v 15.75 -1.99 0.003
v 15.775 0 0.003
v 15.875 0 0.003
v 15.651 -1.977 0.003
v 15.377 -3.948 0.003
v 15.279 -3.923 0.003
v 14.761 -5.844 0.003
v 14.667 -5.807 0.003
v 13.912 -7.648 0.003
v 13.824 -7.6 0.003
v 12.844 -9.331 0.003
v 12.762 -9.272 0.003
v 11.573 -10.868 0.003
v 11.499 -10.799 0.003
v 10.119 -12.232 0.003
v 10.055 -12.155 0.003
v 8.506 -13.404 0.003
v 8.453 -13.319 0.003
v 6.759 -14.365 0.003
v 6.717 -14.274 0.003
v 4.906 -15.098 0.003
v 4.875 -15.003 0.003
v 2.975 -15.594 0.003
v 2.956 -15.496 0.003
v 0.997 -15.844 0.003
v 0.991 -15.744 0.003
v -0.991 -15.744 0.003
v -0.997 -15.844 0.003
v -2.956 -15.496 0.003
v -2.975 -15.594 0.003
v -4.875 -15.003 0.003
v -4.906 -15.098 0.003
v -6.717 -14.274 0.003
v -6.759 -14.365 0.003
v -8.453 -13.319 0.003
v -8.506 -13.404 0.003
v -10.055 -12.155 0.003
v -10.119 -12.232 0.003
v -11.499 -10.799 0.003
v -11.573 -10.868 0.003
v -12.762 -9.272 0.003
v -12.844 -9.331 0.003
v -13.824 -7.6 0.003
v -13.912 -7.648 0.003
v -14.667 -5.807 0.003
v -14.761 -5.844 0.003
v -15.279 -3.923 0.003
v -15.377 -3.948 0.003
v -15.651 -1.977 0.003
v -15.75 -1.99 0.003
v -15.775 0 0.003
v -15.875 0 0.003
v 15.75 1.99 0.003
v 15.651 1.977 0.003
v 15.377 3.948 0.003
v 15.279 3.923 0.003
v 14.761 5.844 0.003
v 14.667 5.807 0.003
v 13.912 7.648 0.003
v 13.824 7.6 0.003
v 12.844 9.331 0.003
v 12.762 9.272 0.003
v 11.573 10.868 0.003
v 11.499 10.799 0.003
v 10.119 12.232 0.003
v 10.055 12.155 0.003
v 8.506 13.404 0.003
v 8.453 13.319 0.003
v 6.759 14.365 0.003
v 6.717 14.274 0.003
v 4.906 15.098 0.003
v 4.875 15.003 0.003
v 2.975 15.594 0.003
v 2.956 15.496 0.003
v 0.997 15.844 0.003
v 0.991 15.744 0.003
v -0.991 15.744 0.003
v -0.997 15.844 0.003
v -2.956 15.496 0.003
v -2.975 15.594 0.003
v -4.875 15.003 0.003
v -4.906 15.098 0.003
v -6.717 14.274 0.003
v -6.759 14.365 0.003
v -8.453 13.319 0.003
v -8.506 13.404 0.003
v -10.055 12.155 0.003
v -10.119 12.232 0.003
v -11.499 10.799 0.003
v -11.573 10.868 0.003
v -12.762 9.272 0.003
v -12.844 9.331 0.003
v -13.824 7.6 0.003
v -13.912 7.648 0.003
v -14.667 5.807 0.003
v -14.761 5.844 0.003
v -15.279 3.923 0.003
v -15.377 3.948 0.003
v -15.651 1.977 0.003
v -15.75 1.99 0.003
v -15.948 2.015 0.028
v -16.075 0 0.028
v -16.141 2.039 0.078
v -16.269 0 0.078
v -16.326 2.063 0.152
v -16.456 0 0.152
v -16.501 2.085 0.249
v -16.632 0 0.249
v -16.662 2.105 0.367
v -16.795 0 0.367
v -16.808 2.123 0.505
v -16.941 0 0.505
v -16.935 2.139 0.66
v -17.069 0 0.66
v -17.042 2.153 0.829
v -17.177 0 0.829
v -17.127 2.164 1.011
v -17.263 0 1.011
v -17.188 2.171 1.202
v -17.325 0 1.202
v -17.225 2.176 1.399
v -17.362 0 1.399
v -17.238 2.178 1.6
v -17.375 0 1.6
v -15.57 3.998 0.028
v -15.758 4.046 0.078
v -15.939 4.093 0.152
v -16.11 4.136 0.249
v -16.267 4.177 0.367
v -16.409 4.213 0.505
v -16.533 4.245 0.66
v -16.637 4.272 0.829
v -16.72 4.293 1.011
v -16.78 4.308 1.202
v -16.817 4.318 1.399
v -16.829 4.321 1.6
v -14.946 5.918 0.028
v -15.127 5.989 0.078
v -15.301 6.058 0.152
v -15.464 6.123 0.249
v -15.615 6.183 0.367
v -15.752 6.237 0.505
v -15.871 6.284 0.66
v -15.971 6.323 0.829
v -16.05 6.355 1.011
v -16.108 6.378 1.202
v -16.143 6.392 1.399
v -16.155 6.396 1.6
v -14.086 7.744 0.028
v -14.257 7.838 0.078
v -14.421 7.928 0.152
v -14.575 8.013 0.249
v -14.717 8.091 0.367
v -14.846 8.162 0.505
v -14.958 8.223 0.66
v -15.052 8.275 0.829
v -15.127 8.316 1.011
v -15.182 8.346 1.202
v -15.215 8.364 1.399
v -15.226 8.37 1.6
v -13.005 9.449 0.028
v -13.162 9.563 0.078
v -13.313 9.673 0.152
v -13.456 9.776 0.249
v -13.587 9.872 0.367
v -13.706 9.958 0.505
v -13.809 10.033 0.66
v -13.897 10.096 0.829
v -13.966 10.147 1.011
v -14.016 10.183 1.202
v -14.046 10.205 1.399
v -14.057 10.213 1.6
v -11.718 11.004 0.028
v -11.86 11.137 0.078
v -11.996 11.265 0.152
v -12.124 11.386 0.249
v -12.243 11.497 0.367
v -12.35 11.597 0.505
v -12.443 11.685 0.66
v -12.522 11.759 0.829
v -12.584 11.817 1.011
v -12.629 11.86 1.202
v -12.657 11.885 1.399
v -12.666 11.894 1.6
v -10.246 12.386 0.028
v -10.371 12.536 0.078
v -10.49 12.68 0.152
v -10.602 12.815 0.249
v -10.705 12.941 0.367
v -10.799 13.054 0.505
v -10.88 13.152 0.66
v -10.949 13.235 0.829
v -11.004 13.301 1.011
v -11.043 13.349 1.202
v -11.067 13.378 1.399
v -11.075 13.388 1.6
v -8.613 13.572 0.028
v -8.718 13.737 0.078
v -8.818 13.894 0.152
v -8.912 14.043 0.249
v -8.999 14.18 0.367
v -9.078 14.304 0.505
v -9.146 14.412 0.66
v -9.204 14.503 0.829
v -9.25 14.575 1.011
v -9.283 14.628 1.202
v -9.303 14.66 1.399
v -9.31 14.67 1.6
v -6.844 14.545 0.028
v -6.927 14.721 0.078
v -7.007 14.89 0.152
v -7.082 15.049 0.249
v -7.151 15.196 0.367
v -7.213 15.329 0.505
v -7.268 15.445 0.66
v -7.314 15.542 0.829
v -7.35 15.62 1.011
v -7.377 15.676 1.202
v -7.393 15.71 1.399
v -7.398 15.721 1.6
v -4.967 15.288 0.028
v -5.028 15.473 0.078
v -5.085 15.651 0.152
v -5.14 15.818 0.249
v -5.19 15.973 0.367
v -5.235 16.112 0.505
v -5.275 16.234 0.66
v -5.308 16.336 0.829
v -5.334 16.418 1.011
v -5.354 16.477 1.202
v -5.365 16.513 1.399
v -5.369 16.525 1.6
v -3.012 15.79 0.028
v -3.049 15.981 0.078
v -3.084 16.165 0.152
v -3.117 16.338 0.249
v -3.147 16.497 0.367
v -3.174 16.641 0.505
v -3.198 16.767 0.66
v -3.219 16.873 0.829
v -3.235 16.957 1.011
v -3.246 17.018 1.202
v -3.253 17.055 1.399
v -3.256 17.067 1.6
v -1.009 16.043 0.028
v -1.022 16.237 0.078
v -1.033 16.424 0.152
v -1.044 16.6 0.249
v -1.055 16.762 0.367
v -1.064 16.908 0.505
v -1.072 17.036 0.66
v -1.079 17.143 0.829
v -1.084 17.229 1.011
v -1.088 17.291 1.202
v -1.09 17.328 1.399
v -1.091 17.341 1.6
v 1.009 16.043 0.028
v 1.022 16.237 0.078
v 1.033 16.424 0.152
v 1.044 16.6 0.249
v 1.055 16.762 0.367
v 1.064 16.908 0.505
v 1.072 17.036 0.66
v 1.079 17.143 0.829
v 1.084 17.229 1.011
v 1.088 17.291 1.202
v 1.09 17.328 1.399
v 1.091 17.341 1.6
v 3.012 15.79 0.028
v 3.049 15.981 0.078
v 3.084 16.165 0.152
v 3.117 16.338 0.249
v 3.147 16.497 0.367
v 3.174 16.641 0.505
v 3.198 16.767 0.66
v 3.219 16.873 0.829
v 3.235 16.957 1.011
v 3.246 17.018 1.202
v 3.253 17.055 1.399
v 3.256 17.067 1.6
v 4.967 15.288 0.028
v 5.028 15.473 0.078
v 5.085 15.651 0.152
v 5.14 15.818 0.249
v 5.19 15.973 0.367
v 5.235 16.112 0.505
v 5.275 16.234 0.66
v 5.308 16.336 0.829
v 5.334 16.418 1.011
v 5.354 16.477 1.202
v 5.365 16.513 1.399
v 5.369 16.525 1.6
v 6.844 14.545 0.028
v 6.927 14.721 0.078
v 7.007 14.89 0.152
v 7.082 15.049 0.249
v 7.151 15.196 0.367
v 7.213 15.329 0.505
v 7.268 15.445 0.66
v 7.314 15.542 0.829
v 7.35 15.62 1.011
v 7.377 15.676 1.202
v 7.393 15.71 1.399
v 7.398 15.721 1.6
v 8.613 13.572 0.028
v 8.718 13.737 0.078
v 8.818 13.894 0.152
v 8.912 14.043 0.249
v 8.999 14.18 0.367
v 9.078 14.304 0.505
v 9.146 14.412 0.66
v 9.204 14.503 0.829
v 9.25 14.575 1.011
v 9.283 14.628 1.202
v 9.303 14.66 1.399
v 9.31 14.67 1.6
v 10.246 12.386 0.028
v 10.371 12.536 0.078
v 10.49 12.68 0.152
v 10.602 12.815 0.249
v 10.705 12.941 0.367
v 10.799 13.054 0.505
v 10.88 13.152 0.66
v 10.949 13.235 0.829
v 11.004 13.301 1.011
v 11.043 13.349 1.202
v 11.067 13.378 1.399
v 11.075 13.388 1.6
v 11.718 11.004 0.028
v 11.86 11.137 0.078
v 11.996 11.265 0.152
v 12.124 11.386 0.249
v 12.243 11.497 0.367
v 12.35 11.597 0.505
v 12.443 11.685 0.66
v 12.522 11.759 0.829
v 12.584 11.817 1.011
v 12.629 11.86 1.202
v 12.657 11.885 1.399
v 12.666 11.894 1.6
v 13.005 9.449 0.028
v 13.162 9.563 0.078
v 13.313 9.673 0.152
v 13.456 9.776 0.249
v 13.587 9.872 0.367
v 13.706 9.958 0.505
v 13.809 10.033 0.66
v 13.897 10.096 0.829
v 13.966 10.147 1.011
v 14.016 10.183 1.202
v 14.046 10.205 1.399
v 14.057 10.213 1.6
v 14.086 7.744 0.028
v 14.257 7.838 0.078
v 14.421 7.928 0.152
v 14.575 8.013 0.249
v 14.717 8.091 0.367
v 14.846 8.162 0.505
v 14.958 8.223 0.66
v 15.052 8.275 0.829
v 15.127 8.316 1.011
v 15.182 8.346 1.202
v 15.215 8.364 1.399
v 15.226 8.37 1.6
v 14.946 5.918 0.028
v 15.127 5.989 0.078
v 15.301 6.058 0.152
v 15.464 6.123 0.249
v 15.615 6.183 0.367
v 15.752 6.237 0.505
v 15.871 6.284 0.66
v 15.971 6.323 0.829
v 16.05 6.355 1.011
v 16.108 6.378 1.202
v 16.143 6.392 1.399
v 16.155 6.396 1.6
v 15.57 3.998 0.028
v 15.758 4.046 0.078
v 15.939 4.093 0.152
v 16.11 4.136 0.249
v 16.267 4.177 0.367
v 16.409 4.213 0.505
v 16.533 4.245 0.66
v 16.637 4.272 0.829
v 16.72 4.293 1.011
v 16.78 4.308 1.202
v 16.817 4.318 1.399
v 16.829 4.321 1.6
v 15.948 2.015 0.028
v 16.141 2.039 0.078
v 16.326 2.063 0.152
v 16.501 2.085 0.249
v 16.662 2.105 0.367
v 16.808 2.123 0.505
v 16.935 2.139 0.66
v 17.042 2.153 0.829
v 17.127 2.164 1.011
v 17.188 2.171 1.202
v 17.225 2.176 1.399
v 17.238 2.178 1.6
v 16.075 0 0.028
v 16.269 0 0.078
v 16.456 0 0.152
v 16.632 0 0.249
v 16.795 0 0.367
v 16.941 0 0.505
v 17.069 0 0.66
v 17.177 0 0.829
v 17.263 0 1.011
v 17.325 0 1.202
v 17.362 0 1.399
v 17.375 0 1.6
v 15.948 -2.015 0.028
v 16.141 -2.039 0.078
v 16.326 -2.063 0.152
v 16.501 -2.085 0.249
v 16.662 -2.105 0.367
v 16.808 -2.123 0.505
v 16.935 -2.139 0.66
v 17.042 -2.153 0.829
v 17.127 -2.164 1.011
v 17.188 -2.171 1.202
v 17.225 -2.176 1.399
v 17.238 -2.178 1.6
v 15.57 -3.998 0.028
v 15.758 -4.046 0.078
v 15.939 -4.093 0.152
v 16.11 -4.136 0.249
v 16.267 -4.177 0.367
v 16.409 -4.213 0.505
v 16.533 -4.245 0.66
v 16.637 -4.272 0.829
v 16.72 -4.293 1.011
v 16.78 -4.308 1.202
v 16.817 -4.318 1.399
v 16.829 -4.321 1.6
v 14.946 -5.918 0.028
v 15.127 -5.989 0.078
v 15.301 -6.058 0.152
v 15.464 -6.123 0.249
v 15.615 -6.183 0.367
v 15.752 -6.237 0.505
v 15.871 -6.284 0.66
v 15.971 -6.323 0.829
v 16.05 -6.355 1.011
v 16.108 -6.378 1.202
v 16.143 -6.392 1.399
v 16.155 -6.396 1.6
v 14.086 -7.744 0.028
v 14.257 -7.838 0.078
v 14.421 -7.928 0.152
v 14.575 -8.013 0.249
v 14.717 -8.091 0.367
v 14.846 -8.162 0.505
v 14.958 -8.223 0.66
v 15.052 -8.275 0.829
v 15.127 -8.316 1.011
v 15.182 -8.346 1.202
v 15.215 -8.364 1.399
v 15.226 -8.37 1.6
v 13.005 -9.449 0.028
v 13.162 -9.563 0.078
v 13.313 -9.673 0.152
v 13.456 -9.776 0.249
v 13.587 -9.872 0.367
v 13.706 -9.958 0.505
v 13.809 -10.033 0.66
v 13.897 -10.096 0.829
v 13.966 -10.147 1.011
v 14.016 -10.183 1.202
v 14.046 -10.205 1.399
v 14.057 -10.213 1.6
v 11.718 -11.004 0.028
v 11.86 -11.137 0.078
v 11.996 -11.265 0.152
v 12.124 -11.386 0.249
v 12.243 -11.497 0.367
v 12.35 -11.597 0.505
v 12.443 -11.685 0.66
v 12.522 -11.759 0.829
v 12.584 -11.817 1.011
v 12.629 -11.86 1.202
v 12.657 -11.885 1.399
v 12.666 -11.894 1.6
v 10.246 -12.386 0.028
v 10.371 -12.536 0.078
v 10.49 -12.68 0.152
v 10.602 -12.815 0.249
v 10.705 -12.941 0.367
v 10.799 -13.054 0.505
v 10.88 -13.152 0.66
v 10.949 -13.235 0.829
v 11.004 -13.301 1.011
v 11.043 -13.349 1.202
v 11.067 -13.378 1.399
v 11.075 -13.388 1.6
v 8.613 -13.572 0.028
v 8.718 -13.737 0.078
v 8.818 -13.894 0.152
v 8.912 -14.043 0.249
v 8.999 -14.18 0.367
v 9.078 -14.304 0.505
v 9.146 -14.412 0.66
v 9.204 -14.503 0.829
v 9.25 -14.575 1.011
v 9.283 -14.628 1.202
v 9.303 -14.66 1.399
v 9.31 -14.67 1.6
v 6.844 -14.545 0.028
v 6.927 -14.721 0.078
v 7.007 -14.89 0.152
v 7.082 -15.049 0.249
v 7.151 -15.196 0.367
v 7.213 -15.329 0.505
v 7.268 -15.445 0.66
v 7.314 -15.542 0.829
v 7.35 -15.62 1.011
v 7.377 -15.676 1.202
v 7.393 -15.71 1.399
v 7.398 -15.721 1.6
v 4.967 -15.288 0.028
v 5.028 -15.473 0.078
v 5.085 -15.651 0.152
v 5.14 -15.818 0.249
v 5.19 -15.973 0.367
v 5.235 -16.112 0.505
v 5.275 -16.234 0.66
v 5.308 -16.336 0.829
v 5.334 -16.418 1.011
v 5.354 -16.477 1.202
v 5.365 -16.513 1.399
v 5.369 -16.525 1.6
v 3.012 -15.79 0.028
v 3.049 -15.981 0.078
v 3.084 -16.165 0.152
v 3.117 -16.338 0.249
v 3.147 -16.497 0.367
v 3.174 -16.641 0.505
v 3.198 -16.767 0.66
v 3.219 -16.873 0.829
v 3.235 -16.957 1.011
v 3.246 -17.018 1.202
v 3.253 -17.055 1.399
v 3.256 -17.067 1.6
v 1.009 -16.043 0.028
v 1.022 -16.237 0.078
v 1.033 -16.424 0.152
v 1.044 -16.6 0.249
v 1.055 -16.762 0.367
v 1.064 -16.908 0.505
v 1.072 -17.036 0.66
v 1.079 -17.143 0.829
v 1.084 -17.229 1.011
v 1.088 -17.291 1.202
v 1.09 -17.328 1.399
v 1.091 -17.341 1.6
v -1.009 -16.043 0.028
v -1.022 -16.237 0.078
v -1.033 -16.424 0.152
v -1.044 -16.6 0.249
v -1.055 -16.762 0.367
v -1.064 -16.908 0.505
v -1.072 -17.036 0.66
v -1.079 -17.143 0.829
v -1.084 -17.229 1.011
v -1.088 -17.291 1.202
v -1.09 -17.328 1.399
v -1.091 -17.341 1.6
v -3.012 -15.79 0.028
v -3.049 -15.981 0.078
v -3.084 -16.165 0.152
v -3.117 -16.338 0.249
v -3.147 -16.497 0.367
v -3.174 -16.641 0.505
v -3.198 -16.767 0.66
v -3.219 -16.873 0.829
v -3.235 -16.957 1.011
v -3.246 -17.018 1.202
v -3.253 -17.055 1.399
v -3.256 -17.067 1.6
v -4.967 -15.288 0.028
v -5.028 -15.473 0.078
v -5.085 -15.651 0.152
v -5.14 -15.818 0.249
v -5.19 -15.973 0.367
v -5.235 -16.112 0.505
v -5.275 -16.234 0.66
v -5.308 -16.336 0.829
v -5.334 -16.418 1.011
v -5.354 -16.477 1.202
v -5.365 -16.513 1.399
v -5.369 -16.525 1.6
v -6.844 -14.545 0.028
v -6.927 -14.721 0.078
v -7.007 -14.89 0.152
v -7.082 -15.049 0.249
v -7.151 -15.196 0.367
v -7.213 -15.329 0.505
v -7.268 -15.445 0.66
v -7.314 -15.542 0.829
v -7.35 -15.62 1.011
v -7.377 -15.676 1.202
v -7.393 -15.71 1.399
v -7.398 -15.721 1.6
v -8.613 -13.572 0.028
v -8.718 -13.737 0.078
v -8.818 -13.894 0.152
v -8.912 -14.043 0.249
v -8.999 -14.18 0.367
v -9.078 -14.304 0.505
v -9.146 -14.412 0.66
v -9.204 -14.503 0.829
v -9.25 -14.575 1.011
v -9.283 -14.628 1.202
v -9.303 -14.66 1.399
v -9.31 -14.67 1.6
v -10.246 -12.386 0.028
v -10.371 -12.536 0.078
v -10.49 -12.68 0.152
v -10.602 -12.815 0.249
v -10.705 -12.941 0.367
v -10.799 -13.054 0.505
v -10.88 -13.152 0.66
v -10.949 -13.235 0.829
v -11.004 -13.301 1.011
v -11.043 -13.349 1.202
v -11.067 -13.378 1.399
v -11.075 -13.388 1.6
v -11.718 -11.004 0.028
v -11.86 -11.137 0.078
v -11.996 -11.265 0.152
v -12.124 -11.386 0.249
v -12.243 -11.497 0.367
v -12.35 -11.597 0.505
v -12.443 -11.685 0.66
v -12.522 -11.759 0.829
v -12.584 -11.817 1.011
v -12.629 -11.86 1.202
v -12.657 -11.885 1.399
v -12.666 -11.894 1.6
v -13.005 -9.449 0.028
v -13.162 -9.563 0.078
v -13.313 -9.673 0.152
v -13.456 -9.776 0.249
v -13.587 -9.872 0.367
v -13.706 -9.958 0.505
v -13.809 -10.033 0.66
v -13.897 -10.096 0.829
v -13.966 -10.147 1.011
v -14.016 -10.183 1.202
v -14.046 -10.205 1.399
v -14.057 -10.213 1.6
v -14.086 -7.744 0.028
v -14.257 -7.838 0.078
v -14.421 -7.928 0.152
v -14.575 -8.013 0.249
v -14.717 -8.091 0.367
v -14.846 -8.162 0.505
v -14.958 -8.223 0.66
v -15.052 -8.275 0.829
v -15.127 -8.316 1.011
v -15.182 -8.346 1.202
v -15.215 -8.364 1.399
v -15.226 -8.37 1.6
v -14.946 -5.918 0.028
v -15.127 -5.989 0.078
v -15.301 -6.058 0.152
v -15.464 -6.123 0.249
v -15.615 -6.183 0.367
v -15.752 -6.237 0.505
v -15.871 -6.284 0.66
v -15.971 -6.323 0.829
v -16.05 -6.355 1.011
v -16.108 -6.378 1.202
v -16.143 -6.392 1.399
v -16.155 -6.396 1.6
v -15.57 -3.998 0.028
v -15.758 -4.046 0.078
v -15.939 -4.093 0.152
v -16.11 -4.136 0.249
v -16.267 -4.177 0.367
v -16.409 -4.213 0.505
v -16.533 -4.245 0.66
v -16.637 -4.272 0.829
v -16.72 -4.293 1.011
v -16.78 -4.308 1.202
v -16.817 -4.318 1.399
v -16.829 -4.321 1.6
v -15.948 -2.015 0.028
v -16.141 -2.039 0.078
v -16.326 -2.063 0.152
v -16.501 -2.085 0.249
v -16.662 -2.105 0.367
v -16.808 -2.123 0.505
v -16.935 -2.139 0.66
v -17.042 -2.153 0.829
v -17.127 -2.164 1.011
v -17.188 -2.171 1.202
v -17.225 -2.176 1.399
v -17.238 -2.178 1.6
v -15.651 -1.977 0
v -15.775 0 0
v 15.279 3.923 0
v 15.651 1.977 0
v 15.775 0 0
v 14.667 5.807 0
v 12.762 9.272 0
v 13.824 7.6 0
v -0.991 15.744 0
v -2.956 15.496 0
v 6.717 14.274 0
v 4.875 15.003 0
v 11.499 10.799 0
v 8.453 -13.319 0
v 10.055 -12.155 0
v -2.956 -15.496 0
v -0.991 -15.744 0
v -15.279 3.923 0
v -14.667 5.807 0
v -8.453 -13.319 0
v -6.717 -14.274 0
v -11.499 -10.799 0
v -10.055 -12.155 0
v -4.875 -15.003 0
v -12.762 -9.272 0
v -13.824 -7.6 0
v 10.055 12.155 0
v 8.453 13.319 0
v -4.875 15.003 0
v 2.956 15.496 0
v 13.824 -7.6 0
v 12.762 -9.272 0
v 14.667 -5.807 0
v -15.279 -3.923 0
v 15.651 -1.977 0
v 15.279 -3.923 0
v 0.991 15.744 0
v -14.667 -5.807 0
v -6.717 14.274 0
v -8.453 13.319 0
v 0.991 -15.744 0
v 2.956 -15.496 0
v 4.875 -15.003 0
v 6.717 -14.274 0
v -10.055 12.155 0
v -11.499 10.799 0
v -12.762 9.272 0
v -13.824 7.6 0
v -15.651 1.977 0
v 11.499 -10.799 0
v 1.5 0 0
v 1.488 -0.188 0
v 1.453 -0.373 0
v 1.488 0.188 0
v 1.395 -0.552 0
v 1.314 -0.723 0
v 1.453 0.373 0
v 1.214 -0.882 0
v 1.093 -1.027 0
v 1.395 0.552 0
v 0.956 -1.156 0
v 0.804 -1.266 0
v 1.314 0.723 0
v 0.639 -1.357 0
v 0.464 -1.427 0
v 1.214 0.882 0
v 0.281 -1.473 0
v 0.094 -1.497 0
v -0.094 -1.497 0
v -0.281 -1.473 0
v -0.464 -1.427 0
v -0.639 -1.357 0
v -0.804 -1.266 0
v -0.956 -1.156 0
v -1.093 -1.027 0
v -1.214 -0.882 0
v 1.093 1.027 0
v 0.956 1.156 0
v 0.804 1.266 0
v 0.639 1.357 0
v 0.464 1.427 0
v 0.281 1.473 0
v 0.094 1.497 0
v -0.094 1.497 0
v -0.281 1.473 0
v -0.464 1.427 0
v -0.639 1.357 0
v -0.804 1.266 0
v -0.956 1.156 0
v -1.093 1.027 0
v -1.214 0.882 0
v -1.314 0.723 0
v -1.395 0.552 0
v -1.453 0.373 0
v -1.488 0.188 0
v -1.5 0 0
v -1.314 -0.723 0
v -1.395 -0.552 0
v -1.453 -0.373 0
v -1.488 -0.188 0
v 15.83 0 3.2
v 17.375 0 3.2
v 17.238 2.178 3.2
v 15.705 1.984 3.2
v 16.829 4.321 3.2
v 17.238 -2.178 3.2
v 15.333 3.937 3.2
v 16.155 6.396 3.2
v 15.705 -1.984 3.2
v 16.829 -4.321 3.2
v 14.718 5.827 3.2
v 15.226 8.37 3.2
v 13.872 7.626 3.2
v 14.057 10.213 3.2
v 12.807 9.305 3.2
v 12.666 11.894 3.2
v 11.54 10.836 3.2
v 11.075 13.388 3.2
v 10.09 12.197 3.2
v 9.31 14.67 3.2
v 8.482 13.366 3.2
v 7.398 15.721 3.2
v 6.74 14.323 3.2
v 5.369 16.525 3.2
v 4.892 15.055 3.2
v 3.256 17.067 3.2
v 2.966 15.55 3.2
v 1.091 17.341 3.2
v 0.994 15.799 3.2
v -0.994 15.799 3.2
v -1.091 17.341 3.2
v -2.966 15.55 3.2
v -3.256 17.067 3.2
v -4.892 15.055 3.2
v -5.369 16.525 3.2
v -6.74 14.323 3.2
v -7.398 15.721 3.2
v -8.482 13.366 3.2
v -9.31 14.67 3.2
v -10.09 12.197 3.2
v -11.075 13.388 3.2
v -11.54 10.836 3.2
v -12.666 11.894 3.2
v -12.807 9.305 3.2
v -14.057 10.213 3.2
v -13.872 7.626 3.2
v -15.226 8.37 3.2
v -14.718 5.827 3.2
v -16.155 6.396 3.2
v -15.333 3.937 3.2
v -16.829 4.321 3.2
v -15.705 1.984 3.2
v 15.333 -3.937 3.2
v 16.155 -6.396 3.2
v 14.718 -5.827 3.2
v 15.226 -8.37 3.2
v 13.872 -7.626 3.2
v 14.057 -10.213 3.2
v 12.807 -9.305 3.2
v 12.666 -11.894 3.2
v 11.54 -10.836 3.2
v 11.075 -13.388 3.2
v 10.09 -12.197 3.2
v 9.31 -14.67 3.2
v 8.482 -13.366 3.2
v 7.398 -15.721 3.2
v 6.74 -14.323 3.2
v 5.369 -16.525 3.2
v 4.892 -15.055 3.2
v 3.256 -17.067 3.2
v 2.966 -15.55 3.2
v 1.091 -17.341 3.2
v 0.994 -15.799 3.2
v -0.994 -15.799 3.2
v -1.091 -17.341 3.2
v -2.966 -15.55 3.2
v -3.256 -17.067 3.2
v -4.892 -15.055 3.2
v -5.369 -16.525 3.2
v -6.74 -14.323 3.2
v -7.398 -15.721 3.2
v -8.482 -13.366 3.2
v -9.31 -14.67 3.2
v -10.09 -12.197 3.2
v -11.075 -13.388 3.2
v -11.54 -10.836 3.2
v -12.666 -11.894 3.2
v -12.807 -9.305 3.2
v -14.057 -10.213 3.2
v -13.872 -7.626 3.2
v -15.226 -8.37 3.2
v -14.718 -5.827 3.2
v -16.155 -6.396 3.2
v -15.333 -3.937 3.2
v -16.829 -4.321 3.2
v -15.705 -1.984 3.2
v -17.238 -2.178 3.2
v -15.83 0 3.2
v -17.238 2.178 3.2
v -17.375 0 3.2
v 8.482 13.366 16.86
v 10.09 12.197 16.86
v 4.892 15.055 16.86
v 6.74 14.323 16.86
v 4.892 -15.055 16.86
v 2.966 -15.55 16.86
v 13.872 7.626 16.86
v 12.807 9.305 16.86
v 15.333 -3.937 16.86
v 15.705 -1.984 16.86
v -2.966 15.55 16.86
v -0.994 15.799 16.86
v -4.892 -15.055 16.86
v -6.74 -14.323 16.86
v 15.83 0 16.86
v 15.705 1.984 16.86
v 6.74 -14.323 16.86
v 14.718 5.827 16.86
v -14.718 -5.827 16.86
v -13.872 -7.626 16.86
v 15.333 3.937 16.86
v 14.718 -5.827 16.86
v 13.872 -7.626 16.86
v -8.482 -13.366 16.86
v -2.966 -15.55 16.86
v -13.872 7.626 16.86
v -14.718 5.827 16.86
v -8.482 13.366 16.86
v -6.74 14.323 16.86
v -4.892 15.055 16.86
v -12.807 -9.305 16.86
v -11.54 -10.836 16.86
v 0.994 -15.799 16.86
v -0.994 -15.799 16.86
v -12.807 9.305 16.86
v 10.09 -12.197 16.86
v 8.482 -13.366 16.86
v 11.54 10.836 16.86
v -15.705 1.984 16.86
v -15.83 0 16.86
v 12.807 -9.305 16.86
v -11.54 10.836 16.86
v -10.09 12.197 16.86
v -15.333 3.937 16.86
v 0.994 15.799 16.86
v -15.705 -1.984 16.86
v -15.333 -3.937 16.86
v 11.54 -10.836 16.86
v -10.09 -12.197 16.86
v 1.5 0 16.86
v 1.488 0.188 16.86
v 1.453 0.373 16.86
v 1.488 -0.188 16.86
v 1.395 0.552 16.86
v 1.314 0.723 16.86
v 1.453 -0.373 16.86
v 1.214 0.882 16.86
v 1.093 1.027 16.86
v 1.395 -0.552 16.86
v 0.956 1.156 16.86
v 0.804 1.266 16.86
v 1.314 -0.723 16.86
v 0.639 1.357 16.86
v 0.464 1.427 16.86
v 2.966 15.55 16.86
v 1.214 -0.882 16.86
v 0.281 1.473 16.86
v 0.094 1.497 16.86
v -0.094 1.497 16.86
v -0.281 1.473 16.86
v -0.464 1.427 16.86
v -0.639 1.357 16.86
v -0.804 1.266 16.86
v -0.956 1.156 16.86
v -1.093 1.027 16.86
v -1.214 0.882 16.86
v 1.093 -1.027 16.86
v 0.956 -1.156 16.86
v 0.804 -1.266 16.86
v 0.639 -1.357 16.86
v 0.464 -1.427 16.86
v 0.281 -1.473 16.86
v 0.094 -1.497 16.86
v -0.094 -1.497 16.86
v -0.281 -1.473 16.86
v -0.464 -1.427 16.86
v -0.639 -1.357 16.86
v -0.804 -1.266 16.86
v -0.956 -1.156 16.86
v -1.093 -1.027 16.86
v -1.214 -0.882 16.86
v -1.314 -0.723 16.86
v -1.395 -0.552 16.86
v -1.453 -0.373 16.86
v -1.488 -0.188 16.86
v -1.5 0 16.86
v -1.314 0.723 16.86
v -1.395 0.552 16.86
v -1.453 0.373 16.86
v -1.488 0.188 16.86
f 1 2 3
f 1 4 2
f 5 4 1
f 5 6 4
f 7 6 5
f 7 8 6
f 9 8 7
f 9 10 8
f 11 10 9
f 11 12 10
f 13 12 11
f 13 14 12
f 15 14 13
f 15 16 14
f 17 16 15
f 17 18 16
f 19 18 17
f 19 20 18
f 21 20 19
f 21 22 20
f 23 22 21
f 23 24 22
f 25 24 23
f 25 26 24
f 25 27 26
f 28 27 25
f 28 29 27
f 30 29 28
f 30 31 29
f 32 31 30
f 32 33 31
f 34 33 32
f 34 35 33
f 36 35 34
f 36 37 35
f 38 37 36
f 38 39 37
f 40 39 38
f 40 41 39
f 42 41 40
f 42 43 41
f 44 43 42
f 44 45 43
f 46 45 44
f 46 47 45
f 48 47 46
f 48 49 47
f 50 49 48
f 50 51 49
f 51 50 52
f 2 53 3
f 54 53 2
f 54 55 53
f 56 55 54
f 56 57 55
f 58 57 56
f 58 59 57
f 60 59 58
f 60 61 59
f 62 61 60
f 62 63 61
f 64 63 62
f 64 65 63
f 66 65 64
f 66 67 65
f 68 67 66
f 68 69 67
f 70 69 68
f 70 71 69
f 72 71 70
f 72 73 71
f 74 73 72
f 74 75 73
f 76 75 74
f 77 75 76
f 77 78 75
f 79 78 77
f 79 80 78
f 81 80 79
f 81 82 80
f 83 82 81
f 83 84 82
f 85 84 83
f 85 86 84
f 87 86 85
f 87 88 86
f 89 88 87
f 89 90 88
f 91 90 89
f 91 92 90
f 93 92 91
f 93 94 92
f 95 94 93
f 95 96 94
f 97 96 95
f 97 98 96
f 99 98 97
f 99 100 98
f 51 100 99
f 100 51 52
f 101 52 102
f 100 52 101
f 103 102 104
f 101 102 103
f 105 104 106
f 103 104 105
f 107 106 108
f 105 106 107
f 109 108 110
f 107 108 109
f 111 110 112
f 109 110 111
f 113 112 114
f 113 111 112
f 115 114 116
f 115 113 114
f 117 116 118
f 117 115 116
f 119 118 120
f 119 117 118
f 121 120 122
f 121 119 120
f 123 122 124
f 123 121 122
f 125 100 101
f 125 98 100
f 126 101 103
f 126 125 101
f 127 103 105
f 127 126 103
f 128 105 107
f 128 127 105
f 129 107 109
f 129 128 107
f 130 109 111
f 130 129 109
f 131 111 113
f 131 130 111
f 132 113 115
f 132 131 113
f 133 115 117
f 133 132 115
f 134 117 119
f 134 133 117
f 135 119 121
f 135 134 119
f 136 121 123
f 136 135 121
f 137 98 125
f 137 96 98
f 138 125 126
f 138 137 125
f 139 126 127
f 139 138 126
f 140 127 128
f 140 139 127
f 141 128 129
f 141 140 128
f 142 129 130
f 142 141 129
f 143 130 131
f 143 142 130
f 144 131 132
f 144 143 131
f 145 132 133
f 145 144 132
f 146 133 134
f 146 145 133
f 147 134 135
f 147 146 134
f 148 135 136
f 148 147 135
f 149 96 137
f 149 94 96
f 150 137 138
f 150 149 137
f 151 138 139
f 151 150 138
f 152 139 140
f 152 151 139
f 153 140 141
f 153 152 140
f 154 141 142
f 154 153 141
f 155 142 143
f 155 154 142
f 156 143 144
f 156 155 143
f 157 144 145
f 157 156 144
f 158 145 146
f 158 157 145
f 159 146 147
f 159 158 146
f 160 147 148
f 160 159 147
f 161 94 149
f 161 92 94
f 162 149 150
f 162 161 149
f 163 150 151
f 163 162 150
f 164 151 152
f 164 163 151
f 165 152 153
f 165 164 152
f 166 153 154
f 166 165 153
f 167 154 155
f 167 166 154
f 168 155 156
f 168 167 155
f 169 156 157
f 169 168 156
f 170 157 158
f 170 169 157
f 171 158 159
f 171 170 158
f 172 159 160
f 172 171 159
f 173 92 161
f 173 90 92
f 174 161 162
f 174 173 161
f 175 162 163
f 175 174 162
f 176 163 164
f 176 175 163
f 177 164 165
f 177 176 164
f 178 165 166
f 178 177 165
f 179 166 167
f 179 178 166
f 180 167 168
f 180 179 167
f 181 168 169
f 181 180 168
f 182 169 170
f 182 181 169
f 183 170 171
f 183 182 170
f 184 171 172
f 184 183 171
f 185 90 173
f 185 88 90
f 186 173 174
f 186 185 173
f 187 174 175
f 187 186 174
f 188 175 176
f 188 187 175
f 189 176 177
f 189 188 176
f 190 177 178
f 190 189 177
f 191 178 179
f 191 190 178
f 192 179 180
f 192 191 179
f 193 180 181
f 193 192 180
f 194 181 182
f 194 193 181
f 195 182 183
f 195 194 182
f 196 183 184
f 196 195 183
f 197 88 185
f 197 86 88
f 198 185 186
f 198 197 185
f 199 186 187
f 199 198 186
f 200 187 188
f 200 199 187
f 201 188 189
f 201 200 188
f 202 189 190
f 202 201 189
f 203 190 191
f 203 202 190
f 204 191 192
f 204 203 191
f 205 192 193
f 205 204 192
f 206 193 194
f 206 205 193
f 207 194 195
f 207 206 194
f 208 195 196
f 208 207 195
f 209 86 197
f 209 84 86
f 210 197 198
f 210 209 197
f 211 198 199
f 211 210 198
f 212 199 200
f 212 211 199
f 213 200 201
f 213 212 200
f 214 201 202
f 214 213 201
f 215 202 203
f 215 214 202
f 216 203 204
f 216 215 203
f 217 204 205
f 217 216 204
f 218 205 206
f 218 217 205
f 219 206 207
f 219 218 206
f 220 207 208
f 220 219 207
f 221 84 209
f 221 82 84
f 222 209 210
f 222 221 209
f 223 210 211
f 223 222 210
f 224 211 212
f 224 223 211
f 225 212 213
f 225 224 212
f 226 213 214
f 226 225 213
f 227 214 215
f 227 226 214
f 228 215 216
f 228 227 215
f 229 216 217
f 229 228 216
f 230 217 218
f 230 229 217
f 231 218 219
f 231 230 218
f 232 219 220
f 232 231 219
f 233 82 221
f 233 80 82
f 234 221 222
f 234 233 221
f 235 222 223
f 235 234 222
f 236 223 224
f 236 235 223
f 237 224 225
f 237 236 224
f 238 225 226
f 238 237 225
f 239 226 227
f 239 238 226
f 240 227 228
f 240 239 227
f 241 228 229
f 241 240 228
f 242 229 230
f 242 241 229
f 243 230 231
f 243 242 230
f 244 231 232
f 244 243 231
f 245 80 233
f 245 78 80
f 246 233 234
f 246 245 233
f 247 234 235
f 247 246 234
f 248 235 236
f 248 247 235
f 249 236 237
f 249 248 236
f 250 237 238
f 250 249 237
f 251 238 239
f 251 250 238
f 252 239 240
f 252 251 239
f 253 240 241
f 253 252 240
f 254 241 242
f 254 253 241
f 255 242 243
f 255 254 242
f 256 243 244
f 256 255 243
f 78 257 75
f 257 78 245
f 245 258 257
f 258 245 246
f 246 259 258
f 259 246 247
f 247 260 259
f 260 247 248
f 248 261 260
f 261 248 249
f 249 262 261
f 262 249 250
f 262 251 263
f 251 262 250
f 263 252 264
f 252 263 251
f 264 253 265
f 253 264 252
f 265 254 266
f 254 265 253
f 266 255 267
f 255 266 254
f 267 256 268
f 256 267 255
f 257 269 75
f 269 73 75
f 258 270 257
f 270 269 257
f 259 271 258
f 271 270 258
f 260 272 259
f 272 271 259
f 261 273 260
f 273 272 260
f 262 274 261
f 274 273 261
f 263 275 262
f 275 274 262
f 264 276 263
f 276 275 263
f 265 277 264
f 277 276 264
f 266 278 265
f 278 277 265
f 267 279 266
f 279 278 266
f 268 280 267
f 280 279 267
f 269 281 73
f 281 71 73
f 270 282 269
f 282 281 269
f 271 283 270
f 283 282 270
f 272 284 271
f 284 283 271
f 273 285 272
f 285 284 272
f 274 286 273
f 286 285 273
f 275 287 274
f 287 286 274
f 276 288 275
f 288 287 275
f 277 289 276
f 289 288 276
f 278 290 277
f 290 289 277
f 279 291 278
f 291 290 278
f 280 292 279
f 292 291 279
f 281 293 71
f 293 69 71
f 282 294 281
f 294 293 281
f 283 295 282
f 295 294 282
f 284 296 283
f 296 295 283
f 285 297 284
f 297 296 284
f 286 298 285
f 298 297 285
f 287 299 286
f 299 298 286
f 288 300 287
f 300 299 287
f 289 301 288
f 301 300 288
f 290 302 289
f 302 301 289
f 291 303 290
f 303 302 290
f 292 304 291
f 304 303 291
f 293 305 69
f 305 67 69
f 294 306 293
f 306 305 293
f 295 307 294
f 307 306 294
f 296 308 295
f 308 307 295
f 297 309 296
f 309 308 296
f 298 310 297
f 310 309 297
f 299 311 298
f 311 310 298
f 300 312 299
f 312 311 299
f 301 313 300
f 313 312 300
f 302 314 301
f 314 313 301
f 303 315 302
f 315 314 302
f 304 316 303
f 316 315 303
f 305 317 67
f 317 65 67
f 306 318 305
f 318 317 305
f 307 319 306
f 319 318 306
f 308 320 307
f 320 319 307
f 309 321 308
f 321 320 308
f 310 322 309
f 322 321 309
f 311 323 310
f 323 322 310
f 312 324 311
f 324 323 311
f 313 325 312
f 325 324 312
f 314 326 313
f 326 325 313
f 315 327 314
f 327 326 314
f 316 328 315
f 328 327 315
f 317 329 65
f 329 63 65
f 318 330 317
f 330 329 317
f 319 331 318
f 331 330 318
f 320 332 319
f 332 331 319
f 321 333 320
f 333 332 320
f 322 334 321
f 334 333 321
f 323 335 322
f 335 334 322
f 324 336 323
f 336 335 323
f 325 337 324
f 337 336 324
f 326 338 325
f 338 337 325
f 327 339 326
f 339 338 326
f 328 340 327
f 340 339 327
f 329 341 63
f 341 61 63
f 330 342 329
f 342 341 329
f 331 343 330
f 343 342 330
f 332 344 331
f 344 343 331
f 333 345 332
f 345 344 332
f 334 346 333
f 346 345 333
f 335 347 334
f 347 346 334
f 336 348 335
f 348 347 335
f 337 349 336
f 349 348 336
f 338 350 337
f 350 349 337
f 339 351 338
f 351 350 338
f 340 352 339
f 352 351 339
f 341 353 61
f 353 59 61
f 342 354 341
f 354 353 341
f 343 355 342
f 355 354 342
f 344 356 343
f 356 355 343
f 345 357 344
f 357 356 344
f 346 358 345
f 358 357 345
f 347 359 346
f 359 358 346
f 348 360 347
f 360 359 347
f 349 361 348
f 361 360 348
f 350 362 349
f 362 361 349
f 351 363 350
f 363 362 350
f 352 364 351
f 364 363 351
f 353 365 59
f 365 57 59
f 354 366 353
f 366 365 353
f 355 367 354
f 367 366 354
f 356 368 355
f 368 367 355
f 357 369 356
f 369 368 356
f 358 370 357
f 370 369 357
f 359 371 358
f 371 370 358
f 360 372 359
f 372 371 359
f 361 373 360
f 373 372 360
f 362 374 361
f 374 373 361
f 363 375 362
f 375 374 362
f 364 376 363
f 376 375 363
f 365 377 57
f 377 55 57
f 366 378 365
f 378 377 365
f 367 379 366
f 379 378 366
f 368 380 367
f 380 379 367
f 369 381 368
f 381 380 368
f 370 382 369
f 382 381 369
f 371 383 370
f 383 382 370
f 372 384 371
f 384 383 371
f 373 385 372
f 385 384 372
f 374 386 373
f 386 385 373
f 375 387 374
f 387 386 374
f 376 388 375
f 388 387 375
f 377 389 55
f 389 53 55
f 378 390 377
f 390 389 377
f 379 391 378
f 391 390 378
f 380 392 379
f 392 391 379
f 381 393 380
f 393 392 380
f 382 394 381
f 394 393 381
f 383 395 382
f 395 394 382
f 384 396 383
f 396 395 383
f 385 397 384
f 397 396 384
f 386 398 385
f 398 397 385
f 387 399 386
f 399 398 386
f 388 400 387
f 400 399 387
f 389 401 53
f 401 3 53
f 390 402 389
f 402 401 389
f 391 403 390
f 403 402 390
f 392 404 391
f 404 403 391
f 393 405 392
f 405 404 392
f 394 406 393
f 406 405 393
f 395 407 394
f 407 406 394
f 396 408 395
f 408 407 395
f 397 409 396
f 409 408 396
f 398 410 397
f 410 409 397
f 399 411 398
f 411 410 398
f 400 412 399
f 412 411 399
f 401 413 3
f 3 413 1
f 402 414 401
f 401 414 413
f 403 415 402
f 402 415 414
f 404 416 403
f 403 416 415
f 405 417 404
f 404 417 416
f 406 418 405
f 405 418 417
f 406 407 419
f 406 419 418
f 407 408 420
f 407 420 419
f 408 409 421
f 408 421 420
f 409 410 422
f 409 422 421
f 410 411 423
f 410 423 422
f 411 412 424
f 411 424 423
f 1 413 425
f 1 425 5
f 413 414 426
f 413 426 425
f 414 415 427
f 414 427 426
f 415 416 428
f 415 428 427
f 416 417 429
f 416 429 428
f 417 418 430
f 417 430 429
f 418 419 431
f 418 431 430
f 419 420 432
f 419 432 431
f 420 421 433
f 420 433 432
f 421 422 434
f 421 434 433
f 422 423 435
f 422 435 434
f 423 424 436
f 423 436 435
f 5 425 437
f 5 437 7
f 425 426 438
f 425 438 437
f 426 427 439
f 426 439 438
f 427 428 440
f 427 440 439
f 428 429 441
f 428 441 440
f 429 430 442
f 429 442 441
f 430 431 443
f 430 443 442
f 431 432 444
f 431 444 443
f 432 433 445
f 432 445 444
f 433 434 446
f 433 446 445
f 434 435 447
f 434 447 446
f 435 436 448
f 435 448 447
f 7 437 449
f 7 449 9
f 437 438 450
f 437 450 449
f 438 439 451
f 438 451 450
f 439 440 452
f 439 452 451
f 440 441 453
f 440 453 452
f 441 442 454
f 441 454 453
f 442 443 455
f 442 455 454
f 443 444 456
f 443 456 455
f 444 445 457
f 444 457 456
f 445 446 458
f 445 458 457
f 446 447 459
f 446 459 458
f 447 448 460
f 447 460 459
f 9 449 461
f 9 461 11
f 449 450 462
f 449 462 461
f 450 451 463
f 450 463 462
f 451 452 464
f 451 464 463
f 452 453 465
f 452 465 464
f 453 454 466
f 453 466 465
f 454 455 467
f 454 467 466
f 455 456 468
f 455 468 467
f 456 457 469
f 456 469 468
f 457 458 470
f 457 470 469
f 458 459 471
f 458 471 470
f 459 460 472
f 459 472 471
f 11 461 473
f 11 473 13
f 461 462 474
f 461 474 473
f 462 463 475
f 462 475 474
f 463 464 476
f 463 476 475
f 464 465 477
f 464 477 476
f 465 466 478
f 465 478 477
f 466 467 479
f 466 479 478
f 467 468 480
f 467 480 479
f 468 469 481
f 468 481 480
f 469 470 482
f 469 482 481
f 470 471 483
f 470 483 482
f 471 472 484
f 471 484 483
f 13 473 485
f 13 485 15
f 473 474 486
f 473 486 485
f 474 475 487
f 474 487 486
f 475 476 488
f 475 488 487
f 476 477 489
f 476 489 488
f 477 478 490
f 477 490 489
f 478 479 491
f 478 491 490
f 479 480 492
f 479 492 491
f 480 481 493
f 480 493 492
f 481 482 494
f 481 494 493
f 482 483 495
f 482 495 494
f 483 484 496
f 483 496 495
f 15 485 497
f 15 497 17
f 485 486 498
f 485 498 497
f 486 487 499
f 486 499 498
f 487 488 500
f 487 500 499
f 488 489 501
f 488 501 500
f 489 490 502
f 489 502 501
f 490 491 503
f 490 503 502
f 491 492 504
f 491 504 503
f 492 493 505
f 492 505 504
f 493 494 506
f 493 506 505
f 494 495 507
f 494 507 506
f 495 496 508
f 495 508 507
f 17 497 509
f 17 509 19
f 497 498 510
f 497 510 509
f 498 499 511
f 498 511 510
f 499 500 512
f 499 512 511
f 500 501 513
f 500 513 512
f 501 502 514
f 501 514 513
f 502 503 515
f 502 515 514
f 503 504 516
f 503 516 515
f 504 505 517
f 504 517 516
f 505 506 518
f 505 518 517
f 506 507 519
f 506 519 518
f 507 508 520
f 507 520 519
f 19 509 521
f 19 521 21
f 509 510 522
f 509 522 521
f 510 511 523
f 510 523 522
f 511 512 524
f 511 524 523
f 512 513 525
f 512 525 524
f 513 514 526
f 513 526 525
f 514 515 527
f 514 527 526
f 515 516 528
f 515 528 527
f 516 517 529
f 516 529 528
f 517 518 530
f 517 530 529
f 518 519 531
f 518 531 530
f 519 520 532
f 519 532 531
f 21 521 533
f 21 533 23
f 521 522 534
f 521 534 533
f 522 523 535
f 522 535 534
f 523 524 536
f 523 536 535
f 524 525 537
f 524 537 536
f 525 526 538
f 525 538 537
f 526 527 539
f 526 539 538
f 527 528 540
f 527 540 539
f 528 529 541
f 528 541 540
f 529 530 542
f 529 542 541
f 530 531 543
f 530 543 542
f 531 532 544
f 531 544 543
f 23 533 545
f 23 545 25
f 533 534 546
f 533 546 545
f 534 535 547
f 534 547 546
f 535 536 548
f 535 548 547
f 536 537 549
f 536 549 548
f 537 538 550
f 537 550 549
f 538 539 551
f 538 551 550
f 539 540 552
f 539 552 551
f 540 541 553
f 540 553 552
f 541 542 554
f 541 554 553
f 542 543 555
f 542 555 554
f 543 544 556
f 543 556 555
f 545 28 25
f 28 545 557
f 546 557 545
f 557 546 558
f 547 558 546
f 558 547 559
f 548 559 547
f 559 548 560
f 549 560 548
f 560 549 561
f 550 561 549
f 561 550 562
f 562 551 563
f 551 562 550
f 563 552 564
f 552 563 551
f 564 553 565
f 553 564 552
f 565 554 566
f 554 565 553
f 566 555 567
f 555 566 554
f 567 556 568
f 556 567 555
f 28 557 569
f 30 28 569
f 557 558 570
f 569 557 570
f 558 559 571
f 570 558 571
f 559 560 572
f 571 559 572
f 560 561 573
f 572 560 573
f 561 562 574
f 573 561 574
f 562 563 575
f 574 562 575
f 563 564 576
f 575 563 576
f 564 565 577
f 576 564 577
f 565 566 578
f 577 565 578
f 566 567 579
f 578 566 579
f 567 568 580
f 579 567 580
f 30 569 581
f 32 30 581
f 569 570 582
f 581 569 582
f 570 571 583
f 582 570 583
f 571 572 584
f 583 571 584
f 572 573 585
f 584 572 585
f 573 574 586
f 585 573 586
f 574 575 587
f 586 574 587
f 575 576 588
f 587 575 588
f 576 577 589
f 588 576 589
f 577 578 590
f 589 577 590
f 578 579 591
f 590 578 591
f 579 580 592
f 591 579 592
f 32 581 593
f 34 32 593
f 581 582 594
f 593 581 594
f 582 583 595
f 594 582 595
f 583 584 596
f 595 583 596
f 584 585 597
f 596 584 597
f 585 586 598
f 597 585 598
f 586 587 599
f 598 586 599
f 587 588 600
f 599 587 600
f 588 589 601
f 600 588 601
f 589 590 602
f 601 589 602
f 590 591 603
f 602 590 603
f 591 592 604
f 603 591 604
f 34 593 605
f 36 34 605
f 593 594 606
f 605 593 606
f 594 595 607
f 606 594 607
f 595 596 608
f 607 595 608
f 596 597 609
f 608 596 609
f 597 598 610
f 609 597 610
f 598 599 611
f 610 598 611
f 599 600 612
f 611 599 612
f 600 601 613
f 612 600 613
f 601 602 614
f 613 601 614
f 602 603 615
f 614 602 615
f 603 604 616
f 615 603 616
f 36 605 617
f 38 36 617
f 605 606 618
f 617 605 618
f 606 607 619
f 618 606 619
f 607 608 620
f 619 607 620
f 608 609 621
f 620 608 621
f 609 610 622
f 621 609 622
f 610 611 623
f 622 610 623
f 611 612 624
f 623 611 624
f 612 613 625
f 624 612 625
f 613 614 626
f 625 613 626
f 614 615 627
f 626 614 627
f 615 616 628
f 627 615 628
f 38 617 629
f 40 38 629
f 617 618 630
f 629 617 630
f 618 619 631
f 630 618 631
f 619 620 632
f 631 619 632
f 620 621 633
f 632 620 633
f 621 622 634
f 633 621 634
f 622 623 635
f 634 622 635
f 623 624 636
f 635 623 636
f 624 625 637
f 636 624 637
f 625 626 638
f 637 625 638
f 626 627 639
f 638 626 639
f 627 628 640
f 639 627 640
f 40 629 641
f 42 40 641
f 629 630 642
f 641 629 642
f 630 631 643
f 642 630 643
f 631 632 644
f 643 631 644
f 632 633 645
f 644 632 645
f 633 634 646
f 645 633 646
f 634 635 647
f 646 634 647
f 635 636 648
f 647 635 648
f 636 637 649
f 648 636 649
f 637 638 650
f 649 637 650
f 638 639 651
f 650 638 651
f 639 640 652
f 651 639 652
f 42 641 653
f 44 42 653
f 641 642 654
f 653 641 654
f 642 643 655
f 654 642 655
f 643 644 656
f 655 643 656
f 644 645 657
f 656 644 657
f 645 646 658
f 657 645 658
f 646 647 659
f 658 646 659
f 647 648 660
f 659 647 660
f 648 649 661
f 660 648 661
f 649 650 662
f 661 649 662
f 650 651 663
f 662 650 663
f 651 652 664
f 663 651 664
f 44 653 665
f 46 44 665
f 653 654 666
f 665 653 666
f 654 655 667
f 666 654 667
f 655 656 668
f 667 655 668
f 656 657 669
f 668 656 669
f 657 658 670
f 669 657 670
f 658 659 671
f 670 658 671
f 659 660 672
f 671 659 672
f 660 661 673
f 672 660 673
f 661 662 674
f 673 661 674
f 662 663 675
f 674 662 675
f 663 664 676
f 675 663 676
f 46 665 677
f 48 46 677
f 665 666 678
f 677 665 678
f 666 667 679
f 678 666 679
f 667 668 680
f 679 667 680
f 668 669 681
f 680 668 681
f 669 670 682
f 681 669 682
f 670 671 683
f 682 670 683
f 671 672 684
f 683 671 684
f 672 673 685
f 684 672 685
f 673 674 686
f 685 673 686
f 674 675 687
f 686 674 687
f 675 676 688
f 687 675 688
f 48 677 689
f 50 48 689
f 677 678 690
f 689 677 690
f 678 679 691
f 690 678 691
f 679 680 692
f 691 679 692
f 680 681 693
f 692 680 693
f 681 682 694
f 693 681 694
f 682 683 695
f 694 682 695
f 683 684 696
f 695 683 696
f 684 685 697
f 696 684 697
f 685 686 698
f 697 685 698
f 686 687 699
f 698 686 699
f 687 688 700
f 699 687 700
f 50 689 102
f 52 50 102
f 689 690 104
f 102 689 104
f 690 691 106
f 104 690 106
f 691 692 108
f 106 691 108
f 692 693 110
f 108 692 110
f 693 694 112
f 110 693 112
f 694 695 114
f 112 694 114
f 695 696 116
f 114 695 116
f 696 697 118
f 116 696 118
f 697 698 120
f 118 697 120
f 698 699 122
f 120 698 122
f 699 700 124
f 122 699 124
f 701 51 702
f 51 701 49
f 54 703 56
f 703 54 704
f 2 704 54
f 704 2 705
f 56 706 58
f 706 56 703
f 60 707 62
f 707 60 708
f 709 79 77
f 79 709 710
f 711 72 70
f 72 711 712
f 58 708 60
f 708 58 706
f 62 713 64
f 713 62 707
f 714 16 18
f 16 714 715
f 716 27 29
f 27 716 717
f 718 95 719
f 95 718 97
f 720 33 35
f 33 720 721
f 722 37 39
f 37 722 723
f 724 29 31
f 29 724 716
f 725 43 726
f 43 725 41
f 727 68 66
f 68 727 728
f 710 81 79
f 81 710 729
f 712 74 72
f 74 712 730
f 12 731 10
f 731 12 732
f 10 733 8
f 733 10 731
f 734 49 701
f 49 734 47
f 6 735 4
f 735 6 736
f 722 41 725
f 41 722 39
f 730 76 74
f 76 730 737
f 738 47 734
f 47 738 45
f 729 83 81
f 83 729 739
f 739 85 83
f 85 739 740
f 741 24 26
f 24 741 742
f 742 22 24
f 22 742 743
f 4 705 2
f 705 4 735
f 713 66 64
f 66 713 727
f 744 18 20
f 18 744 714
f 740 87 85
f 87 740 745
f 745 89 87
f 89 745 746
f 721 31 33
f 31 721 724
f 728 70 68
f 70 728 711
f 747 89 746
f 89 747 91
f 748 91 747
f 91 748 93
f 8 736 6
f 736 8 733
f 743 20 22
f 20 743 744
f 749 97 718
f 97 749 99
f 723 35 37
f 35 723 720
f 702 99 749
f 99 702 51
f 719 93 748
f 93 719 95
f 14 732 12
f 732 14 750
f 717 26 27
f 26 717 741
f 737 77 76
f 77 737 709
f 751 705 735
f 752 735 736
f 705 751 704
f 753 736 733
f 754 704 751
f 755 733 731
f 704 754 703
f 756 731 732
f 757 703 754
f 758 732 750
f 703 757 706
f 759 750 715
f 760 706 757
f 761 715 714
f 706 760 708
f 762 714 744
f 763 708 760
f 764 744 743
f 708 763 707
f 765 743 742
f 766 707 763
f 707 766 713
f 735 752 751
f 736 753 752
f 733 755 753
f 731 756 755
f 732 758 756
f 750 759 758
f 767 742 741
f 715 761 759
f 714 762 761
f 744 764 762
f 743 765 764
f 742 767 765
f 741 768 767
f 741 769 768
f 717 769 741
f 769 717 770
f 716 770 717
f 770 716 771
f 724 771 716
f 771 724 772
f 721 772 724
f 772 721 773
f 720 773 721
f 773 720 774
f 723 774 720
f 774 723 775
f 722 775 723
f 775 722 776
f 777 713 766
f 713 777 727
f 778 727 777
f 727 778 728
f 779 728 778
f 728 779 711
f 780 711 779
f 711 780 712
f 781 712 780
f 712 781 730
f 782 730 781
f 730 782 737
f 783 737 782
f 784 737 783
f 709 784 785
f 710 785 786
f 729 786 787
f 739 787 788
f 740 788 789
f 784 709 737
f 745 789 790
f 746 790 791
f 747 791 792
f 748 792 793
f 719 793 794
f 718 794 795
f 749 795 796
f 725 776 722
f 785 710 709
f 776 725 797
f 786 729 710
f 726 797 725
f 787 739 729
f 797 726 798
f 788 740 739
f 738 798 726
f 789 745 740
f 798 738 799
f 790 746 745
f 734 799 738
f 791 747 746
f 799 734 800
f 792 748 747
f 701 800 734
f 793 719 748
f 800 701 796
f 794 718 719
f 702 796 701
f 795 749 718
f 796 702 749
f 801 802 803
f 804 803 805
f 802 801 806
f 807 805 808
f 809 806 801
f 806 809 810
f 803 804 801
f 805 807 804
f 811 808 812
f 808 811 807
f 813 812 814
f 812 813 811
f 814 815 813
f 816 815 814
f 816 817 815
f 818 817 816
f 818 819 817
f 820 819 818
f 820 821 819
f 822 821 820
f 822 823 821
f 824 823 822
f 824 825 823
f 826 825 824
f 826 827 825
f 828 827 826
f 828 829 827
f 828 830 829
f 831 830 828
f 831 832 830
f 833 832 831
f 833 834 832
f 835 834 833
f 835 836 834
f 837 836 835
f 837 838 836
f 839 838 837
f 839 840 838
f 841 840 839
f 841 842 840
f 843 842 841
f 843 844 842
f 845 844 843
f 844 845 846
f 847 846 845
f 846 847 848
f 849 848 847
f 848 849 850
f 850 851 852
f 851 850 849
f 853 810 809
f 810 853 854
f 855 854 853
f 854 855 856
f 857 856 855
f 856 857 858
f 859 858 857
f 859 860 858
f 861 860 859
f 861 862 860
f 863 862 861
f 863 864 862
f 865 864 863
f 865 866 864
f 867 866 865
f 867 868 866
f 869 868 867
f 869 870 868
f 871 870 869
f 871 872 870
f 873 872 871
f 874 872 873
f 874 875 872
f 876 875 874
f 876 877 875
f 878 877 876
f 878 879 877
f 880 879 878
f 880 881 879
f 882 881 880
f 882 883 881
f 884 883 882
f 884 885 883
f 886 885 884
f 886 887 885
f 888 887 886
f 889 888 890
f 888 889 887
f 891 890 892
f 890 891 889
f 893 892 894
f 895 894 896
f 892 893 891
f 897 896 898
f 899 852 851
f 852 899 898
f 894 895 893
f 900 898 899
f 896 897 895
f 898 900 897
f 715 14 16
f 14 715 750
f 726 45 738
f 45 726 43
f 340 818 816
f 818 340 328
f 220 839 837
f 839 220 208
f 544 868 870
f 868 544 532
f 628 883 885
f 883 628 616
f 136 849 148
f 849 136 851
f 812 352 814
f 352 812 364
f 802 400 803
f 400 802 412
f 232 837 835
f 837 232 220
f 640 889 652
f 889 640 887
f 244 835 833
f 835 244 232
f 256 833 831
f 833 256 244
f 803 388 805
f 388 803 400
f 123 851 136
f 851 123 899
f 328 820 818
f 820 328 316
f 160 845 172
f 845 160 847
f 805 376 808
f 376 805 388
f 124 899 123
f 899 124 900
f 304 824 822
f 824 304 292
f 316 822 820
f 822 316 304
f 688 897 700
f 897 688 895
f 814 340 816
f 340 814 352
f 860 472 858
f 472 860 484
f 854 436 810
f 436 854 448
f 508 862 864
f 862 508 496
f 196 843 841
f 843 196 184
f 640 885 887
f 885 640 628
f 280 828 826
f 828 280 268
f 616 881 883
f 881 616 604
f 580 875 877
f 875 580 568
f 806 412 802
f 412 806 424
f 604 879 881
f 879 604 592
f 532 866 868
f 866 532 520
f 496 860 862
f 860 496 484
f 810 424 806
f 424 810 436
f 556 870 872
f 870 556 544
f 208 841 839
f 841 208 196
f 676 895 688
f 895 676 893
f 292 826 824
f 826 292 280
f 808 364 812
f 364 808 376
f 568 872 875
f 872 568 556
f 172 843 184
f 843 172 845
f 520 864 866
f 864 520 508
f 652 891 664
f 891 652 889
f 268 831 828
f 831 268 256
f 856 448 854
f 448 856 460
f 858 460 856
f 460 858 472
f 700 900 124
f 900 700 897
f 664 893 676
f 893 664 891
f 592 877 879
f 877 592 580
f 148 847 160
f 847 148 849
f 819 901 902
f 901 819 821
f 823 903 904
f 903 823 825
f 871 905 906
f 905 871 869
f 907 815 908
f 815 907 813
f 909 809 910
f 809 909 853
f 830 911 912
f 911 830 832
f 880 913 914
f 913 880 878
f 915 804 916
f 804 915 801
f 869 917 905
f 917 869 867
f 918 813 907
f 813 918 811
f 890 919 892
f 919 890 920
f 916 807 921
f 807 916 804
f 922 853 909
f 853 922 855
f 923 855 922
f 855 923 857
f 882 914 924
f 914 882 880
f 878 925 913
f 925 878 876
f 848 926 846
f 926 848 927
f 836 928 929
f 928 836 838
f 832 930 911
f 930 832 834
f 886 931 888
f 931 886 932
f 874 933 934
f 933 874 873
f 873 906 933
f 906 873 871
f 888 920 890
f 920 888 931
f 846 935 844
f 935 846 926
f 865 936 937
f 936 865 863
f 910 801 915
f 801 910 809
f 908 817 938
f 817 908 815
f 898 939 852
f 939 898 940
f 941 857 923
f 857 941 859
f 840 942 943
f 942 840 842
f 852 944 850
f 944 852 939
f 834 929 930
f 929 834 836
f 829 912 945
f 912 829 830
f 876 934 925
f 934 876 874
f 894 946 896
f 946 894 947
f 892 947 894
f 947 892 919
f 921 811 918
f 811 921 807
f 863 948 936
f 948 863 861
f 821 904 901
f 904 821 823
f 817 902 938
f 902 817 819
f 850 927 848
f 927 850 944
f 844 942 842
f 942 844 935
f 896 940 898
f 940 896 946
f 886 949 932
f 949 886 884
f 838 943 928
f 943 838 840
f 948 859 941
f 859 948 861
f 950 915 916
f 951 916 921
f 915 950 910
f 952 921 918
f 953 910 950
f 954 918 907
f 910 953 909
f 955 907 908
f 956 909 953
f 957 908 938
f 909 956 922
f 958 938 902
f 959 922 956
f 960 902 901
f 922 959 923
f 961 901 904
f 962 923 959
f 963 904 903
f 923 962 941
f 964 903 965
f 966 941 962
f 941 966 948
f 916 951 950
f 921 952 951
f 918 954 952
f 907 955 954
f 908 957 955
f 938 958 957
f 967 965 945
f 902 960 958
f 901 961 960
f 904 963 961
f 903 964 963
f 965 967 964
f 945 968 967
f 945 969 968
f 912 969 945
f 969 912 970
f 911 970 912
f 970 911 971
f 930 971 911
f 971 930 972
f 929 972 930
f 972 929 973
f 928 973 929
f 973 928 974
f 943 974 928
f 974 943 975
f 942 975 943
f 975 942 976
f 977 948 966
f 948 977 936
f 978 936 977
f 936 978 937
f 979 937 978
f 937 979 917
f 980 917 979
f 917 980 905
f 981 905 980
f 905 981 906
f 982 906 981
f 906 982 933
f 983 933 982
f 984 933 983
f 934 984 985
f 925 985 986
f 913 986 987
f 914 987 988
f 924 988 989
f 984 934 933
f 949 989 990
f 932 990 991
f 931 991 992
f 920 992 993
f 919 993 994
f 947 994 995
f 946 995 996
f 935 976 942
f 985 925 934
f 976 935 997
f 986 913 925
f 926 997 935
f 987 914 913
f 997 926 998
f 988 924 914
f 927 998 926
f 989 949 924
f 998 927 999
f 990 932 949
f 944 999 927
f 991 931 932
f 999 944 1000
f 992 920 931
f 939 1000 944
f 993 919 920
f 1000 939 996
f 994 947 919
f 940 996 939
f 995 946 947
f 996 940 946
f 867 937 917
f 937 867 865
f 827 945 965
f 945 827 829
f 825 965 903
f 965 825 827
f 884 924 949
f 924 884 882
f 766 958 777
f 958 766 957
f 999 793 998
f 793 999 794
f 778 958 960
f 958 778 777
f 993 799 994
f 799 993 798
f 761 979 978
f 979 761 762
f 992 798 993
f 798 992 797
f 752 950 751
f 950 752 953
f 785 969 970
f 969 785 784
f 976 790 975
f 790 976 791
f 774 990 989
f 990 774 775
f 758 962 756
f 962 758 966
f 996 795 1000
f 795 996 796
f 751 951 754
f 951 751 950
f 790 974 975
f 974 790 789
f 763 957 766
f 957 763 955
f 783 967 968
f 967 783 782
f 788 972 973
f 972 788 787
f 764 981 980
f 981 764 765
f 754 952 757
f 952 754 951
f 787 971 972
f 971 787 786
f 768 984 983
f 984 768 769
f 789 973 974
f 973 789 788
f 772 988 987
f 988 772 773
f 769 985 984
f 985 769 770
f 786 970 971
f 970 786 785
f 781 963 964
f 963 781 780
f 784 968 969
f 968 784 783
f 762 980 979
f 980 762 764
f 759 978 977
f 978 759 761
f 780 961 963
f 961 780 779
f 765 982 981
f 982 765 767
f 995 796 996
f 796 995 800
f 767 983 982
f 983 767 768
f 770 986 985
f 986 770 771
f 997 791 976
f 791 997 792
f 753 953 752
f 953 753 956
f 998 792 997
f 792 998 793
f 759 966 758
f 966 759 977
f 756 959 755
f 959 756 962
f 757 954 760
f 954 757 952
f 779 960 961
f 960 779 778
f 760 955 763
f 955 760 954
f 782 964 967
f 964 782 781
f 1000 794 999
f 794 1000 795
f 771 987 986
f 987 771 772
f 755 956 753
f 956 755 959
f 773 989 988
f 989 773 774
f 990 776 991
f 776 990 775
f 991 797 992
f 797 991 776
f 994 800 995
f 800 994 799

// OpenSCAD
// file: windvane_cap.scad
// (C) Paul Sonkoly - 2021
// Cape Horn Wind vane closing caps


// bottom thickness - aka flush plate thickness
// bottom diam - flush plate diameter

// shaft diam - part that goes in the tube
// shaft height - how deep it goes in the metal tube

// cut hole in the middle 
// hole_diam - if we cut hole.. diameter 

module cap(bottom_thickness,
           bottom_diam,
           shaft_diam,
           shaft_height,
           cut_hole = false,
           hole_diam) {

    bottom_rad = bottom_diam / 2;

    module torus(r1, r2) {
        rotate_extrude() {
        translate([r2 - r1, 0, 0])
          circle(r1);
        }
    }
    
    module bottom() {
        torus(r1 = bottom_thickness / 2, r2 = bottom_rad);
        translate([0, 0, -bottom_thickness / 2])
          cylinder(h = bottom_thickness, d = bottom_diam - bottom_thickness);
        cylinder(h = bottom_thickness / 2, d = bottom_diam);
    }
    
    module shaft() {   
        translate([0, 0, bottom_thickness / 2])
          cylinder(h=shaft_height, d = shaft_diam);
    }
    
    module mid_hole() {
        translate([0, 0, - bottom_thickness / 2])
          cylinder(d = hole_diam, h = shaft_height + bottom_thickness);
    }

    translate([0, 0, bottom_thickness / 2]) {
        if (cut_hole) {
            difference() {
                union() {
                    bottom();
                    shaft();
                }
    
                mid_hole();
            }
        }
        else {
            bottom();
            shaft();
        }      
  }
}


/*cap(bottom_thickness = 3.2,
    bottom_diam = 34.75,
    shaft_diam = 31.66,
    shaft_height = 13.66,
    cut_hole = true,
    hole_diam = 3
);*/
// main file
use <windvane_cap.scad>;

$fn = 50;

cap(bottom_thickness = 3.2,
    bottom_diam = 34.75,
    shaft_diam = 31.66,
    shaft_height = 13.66,
    cut_hole = true,
    hole_diam = 3);  
